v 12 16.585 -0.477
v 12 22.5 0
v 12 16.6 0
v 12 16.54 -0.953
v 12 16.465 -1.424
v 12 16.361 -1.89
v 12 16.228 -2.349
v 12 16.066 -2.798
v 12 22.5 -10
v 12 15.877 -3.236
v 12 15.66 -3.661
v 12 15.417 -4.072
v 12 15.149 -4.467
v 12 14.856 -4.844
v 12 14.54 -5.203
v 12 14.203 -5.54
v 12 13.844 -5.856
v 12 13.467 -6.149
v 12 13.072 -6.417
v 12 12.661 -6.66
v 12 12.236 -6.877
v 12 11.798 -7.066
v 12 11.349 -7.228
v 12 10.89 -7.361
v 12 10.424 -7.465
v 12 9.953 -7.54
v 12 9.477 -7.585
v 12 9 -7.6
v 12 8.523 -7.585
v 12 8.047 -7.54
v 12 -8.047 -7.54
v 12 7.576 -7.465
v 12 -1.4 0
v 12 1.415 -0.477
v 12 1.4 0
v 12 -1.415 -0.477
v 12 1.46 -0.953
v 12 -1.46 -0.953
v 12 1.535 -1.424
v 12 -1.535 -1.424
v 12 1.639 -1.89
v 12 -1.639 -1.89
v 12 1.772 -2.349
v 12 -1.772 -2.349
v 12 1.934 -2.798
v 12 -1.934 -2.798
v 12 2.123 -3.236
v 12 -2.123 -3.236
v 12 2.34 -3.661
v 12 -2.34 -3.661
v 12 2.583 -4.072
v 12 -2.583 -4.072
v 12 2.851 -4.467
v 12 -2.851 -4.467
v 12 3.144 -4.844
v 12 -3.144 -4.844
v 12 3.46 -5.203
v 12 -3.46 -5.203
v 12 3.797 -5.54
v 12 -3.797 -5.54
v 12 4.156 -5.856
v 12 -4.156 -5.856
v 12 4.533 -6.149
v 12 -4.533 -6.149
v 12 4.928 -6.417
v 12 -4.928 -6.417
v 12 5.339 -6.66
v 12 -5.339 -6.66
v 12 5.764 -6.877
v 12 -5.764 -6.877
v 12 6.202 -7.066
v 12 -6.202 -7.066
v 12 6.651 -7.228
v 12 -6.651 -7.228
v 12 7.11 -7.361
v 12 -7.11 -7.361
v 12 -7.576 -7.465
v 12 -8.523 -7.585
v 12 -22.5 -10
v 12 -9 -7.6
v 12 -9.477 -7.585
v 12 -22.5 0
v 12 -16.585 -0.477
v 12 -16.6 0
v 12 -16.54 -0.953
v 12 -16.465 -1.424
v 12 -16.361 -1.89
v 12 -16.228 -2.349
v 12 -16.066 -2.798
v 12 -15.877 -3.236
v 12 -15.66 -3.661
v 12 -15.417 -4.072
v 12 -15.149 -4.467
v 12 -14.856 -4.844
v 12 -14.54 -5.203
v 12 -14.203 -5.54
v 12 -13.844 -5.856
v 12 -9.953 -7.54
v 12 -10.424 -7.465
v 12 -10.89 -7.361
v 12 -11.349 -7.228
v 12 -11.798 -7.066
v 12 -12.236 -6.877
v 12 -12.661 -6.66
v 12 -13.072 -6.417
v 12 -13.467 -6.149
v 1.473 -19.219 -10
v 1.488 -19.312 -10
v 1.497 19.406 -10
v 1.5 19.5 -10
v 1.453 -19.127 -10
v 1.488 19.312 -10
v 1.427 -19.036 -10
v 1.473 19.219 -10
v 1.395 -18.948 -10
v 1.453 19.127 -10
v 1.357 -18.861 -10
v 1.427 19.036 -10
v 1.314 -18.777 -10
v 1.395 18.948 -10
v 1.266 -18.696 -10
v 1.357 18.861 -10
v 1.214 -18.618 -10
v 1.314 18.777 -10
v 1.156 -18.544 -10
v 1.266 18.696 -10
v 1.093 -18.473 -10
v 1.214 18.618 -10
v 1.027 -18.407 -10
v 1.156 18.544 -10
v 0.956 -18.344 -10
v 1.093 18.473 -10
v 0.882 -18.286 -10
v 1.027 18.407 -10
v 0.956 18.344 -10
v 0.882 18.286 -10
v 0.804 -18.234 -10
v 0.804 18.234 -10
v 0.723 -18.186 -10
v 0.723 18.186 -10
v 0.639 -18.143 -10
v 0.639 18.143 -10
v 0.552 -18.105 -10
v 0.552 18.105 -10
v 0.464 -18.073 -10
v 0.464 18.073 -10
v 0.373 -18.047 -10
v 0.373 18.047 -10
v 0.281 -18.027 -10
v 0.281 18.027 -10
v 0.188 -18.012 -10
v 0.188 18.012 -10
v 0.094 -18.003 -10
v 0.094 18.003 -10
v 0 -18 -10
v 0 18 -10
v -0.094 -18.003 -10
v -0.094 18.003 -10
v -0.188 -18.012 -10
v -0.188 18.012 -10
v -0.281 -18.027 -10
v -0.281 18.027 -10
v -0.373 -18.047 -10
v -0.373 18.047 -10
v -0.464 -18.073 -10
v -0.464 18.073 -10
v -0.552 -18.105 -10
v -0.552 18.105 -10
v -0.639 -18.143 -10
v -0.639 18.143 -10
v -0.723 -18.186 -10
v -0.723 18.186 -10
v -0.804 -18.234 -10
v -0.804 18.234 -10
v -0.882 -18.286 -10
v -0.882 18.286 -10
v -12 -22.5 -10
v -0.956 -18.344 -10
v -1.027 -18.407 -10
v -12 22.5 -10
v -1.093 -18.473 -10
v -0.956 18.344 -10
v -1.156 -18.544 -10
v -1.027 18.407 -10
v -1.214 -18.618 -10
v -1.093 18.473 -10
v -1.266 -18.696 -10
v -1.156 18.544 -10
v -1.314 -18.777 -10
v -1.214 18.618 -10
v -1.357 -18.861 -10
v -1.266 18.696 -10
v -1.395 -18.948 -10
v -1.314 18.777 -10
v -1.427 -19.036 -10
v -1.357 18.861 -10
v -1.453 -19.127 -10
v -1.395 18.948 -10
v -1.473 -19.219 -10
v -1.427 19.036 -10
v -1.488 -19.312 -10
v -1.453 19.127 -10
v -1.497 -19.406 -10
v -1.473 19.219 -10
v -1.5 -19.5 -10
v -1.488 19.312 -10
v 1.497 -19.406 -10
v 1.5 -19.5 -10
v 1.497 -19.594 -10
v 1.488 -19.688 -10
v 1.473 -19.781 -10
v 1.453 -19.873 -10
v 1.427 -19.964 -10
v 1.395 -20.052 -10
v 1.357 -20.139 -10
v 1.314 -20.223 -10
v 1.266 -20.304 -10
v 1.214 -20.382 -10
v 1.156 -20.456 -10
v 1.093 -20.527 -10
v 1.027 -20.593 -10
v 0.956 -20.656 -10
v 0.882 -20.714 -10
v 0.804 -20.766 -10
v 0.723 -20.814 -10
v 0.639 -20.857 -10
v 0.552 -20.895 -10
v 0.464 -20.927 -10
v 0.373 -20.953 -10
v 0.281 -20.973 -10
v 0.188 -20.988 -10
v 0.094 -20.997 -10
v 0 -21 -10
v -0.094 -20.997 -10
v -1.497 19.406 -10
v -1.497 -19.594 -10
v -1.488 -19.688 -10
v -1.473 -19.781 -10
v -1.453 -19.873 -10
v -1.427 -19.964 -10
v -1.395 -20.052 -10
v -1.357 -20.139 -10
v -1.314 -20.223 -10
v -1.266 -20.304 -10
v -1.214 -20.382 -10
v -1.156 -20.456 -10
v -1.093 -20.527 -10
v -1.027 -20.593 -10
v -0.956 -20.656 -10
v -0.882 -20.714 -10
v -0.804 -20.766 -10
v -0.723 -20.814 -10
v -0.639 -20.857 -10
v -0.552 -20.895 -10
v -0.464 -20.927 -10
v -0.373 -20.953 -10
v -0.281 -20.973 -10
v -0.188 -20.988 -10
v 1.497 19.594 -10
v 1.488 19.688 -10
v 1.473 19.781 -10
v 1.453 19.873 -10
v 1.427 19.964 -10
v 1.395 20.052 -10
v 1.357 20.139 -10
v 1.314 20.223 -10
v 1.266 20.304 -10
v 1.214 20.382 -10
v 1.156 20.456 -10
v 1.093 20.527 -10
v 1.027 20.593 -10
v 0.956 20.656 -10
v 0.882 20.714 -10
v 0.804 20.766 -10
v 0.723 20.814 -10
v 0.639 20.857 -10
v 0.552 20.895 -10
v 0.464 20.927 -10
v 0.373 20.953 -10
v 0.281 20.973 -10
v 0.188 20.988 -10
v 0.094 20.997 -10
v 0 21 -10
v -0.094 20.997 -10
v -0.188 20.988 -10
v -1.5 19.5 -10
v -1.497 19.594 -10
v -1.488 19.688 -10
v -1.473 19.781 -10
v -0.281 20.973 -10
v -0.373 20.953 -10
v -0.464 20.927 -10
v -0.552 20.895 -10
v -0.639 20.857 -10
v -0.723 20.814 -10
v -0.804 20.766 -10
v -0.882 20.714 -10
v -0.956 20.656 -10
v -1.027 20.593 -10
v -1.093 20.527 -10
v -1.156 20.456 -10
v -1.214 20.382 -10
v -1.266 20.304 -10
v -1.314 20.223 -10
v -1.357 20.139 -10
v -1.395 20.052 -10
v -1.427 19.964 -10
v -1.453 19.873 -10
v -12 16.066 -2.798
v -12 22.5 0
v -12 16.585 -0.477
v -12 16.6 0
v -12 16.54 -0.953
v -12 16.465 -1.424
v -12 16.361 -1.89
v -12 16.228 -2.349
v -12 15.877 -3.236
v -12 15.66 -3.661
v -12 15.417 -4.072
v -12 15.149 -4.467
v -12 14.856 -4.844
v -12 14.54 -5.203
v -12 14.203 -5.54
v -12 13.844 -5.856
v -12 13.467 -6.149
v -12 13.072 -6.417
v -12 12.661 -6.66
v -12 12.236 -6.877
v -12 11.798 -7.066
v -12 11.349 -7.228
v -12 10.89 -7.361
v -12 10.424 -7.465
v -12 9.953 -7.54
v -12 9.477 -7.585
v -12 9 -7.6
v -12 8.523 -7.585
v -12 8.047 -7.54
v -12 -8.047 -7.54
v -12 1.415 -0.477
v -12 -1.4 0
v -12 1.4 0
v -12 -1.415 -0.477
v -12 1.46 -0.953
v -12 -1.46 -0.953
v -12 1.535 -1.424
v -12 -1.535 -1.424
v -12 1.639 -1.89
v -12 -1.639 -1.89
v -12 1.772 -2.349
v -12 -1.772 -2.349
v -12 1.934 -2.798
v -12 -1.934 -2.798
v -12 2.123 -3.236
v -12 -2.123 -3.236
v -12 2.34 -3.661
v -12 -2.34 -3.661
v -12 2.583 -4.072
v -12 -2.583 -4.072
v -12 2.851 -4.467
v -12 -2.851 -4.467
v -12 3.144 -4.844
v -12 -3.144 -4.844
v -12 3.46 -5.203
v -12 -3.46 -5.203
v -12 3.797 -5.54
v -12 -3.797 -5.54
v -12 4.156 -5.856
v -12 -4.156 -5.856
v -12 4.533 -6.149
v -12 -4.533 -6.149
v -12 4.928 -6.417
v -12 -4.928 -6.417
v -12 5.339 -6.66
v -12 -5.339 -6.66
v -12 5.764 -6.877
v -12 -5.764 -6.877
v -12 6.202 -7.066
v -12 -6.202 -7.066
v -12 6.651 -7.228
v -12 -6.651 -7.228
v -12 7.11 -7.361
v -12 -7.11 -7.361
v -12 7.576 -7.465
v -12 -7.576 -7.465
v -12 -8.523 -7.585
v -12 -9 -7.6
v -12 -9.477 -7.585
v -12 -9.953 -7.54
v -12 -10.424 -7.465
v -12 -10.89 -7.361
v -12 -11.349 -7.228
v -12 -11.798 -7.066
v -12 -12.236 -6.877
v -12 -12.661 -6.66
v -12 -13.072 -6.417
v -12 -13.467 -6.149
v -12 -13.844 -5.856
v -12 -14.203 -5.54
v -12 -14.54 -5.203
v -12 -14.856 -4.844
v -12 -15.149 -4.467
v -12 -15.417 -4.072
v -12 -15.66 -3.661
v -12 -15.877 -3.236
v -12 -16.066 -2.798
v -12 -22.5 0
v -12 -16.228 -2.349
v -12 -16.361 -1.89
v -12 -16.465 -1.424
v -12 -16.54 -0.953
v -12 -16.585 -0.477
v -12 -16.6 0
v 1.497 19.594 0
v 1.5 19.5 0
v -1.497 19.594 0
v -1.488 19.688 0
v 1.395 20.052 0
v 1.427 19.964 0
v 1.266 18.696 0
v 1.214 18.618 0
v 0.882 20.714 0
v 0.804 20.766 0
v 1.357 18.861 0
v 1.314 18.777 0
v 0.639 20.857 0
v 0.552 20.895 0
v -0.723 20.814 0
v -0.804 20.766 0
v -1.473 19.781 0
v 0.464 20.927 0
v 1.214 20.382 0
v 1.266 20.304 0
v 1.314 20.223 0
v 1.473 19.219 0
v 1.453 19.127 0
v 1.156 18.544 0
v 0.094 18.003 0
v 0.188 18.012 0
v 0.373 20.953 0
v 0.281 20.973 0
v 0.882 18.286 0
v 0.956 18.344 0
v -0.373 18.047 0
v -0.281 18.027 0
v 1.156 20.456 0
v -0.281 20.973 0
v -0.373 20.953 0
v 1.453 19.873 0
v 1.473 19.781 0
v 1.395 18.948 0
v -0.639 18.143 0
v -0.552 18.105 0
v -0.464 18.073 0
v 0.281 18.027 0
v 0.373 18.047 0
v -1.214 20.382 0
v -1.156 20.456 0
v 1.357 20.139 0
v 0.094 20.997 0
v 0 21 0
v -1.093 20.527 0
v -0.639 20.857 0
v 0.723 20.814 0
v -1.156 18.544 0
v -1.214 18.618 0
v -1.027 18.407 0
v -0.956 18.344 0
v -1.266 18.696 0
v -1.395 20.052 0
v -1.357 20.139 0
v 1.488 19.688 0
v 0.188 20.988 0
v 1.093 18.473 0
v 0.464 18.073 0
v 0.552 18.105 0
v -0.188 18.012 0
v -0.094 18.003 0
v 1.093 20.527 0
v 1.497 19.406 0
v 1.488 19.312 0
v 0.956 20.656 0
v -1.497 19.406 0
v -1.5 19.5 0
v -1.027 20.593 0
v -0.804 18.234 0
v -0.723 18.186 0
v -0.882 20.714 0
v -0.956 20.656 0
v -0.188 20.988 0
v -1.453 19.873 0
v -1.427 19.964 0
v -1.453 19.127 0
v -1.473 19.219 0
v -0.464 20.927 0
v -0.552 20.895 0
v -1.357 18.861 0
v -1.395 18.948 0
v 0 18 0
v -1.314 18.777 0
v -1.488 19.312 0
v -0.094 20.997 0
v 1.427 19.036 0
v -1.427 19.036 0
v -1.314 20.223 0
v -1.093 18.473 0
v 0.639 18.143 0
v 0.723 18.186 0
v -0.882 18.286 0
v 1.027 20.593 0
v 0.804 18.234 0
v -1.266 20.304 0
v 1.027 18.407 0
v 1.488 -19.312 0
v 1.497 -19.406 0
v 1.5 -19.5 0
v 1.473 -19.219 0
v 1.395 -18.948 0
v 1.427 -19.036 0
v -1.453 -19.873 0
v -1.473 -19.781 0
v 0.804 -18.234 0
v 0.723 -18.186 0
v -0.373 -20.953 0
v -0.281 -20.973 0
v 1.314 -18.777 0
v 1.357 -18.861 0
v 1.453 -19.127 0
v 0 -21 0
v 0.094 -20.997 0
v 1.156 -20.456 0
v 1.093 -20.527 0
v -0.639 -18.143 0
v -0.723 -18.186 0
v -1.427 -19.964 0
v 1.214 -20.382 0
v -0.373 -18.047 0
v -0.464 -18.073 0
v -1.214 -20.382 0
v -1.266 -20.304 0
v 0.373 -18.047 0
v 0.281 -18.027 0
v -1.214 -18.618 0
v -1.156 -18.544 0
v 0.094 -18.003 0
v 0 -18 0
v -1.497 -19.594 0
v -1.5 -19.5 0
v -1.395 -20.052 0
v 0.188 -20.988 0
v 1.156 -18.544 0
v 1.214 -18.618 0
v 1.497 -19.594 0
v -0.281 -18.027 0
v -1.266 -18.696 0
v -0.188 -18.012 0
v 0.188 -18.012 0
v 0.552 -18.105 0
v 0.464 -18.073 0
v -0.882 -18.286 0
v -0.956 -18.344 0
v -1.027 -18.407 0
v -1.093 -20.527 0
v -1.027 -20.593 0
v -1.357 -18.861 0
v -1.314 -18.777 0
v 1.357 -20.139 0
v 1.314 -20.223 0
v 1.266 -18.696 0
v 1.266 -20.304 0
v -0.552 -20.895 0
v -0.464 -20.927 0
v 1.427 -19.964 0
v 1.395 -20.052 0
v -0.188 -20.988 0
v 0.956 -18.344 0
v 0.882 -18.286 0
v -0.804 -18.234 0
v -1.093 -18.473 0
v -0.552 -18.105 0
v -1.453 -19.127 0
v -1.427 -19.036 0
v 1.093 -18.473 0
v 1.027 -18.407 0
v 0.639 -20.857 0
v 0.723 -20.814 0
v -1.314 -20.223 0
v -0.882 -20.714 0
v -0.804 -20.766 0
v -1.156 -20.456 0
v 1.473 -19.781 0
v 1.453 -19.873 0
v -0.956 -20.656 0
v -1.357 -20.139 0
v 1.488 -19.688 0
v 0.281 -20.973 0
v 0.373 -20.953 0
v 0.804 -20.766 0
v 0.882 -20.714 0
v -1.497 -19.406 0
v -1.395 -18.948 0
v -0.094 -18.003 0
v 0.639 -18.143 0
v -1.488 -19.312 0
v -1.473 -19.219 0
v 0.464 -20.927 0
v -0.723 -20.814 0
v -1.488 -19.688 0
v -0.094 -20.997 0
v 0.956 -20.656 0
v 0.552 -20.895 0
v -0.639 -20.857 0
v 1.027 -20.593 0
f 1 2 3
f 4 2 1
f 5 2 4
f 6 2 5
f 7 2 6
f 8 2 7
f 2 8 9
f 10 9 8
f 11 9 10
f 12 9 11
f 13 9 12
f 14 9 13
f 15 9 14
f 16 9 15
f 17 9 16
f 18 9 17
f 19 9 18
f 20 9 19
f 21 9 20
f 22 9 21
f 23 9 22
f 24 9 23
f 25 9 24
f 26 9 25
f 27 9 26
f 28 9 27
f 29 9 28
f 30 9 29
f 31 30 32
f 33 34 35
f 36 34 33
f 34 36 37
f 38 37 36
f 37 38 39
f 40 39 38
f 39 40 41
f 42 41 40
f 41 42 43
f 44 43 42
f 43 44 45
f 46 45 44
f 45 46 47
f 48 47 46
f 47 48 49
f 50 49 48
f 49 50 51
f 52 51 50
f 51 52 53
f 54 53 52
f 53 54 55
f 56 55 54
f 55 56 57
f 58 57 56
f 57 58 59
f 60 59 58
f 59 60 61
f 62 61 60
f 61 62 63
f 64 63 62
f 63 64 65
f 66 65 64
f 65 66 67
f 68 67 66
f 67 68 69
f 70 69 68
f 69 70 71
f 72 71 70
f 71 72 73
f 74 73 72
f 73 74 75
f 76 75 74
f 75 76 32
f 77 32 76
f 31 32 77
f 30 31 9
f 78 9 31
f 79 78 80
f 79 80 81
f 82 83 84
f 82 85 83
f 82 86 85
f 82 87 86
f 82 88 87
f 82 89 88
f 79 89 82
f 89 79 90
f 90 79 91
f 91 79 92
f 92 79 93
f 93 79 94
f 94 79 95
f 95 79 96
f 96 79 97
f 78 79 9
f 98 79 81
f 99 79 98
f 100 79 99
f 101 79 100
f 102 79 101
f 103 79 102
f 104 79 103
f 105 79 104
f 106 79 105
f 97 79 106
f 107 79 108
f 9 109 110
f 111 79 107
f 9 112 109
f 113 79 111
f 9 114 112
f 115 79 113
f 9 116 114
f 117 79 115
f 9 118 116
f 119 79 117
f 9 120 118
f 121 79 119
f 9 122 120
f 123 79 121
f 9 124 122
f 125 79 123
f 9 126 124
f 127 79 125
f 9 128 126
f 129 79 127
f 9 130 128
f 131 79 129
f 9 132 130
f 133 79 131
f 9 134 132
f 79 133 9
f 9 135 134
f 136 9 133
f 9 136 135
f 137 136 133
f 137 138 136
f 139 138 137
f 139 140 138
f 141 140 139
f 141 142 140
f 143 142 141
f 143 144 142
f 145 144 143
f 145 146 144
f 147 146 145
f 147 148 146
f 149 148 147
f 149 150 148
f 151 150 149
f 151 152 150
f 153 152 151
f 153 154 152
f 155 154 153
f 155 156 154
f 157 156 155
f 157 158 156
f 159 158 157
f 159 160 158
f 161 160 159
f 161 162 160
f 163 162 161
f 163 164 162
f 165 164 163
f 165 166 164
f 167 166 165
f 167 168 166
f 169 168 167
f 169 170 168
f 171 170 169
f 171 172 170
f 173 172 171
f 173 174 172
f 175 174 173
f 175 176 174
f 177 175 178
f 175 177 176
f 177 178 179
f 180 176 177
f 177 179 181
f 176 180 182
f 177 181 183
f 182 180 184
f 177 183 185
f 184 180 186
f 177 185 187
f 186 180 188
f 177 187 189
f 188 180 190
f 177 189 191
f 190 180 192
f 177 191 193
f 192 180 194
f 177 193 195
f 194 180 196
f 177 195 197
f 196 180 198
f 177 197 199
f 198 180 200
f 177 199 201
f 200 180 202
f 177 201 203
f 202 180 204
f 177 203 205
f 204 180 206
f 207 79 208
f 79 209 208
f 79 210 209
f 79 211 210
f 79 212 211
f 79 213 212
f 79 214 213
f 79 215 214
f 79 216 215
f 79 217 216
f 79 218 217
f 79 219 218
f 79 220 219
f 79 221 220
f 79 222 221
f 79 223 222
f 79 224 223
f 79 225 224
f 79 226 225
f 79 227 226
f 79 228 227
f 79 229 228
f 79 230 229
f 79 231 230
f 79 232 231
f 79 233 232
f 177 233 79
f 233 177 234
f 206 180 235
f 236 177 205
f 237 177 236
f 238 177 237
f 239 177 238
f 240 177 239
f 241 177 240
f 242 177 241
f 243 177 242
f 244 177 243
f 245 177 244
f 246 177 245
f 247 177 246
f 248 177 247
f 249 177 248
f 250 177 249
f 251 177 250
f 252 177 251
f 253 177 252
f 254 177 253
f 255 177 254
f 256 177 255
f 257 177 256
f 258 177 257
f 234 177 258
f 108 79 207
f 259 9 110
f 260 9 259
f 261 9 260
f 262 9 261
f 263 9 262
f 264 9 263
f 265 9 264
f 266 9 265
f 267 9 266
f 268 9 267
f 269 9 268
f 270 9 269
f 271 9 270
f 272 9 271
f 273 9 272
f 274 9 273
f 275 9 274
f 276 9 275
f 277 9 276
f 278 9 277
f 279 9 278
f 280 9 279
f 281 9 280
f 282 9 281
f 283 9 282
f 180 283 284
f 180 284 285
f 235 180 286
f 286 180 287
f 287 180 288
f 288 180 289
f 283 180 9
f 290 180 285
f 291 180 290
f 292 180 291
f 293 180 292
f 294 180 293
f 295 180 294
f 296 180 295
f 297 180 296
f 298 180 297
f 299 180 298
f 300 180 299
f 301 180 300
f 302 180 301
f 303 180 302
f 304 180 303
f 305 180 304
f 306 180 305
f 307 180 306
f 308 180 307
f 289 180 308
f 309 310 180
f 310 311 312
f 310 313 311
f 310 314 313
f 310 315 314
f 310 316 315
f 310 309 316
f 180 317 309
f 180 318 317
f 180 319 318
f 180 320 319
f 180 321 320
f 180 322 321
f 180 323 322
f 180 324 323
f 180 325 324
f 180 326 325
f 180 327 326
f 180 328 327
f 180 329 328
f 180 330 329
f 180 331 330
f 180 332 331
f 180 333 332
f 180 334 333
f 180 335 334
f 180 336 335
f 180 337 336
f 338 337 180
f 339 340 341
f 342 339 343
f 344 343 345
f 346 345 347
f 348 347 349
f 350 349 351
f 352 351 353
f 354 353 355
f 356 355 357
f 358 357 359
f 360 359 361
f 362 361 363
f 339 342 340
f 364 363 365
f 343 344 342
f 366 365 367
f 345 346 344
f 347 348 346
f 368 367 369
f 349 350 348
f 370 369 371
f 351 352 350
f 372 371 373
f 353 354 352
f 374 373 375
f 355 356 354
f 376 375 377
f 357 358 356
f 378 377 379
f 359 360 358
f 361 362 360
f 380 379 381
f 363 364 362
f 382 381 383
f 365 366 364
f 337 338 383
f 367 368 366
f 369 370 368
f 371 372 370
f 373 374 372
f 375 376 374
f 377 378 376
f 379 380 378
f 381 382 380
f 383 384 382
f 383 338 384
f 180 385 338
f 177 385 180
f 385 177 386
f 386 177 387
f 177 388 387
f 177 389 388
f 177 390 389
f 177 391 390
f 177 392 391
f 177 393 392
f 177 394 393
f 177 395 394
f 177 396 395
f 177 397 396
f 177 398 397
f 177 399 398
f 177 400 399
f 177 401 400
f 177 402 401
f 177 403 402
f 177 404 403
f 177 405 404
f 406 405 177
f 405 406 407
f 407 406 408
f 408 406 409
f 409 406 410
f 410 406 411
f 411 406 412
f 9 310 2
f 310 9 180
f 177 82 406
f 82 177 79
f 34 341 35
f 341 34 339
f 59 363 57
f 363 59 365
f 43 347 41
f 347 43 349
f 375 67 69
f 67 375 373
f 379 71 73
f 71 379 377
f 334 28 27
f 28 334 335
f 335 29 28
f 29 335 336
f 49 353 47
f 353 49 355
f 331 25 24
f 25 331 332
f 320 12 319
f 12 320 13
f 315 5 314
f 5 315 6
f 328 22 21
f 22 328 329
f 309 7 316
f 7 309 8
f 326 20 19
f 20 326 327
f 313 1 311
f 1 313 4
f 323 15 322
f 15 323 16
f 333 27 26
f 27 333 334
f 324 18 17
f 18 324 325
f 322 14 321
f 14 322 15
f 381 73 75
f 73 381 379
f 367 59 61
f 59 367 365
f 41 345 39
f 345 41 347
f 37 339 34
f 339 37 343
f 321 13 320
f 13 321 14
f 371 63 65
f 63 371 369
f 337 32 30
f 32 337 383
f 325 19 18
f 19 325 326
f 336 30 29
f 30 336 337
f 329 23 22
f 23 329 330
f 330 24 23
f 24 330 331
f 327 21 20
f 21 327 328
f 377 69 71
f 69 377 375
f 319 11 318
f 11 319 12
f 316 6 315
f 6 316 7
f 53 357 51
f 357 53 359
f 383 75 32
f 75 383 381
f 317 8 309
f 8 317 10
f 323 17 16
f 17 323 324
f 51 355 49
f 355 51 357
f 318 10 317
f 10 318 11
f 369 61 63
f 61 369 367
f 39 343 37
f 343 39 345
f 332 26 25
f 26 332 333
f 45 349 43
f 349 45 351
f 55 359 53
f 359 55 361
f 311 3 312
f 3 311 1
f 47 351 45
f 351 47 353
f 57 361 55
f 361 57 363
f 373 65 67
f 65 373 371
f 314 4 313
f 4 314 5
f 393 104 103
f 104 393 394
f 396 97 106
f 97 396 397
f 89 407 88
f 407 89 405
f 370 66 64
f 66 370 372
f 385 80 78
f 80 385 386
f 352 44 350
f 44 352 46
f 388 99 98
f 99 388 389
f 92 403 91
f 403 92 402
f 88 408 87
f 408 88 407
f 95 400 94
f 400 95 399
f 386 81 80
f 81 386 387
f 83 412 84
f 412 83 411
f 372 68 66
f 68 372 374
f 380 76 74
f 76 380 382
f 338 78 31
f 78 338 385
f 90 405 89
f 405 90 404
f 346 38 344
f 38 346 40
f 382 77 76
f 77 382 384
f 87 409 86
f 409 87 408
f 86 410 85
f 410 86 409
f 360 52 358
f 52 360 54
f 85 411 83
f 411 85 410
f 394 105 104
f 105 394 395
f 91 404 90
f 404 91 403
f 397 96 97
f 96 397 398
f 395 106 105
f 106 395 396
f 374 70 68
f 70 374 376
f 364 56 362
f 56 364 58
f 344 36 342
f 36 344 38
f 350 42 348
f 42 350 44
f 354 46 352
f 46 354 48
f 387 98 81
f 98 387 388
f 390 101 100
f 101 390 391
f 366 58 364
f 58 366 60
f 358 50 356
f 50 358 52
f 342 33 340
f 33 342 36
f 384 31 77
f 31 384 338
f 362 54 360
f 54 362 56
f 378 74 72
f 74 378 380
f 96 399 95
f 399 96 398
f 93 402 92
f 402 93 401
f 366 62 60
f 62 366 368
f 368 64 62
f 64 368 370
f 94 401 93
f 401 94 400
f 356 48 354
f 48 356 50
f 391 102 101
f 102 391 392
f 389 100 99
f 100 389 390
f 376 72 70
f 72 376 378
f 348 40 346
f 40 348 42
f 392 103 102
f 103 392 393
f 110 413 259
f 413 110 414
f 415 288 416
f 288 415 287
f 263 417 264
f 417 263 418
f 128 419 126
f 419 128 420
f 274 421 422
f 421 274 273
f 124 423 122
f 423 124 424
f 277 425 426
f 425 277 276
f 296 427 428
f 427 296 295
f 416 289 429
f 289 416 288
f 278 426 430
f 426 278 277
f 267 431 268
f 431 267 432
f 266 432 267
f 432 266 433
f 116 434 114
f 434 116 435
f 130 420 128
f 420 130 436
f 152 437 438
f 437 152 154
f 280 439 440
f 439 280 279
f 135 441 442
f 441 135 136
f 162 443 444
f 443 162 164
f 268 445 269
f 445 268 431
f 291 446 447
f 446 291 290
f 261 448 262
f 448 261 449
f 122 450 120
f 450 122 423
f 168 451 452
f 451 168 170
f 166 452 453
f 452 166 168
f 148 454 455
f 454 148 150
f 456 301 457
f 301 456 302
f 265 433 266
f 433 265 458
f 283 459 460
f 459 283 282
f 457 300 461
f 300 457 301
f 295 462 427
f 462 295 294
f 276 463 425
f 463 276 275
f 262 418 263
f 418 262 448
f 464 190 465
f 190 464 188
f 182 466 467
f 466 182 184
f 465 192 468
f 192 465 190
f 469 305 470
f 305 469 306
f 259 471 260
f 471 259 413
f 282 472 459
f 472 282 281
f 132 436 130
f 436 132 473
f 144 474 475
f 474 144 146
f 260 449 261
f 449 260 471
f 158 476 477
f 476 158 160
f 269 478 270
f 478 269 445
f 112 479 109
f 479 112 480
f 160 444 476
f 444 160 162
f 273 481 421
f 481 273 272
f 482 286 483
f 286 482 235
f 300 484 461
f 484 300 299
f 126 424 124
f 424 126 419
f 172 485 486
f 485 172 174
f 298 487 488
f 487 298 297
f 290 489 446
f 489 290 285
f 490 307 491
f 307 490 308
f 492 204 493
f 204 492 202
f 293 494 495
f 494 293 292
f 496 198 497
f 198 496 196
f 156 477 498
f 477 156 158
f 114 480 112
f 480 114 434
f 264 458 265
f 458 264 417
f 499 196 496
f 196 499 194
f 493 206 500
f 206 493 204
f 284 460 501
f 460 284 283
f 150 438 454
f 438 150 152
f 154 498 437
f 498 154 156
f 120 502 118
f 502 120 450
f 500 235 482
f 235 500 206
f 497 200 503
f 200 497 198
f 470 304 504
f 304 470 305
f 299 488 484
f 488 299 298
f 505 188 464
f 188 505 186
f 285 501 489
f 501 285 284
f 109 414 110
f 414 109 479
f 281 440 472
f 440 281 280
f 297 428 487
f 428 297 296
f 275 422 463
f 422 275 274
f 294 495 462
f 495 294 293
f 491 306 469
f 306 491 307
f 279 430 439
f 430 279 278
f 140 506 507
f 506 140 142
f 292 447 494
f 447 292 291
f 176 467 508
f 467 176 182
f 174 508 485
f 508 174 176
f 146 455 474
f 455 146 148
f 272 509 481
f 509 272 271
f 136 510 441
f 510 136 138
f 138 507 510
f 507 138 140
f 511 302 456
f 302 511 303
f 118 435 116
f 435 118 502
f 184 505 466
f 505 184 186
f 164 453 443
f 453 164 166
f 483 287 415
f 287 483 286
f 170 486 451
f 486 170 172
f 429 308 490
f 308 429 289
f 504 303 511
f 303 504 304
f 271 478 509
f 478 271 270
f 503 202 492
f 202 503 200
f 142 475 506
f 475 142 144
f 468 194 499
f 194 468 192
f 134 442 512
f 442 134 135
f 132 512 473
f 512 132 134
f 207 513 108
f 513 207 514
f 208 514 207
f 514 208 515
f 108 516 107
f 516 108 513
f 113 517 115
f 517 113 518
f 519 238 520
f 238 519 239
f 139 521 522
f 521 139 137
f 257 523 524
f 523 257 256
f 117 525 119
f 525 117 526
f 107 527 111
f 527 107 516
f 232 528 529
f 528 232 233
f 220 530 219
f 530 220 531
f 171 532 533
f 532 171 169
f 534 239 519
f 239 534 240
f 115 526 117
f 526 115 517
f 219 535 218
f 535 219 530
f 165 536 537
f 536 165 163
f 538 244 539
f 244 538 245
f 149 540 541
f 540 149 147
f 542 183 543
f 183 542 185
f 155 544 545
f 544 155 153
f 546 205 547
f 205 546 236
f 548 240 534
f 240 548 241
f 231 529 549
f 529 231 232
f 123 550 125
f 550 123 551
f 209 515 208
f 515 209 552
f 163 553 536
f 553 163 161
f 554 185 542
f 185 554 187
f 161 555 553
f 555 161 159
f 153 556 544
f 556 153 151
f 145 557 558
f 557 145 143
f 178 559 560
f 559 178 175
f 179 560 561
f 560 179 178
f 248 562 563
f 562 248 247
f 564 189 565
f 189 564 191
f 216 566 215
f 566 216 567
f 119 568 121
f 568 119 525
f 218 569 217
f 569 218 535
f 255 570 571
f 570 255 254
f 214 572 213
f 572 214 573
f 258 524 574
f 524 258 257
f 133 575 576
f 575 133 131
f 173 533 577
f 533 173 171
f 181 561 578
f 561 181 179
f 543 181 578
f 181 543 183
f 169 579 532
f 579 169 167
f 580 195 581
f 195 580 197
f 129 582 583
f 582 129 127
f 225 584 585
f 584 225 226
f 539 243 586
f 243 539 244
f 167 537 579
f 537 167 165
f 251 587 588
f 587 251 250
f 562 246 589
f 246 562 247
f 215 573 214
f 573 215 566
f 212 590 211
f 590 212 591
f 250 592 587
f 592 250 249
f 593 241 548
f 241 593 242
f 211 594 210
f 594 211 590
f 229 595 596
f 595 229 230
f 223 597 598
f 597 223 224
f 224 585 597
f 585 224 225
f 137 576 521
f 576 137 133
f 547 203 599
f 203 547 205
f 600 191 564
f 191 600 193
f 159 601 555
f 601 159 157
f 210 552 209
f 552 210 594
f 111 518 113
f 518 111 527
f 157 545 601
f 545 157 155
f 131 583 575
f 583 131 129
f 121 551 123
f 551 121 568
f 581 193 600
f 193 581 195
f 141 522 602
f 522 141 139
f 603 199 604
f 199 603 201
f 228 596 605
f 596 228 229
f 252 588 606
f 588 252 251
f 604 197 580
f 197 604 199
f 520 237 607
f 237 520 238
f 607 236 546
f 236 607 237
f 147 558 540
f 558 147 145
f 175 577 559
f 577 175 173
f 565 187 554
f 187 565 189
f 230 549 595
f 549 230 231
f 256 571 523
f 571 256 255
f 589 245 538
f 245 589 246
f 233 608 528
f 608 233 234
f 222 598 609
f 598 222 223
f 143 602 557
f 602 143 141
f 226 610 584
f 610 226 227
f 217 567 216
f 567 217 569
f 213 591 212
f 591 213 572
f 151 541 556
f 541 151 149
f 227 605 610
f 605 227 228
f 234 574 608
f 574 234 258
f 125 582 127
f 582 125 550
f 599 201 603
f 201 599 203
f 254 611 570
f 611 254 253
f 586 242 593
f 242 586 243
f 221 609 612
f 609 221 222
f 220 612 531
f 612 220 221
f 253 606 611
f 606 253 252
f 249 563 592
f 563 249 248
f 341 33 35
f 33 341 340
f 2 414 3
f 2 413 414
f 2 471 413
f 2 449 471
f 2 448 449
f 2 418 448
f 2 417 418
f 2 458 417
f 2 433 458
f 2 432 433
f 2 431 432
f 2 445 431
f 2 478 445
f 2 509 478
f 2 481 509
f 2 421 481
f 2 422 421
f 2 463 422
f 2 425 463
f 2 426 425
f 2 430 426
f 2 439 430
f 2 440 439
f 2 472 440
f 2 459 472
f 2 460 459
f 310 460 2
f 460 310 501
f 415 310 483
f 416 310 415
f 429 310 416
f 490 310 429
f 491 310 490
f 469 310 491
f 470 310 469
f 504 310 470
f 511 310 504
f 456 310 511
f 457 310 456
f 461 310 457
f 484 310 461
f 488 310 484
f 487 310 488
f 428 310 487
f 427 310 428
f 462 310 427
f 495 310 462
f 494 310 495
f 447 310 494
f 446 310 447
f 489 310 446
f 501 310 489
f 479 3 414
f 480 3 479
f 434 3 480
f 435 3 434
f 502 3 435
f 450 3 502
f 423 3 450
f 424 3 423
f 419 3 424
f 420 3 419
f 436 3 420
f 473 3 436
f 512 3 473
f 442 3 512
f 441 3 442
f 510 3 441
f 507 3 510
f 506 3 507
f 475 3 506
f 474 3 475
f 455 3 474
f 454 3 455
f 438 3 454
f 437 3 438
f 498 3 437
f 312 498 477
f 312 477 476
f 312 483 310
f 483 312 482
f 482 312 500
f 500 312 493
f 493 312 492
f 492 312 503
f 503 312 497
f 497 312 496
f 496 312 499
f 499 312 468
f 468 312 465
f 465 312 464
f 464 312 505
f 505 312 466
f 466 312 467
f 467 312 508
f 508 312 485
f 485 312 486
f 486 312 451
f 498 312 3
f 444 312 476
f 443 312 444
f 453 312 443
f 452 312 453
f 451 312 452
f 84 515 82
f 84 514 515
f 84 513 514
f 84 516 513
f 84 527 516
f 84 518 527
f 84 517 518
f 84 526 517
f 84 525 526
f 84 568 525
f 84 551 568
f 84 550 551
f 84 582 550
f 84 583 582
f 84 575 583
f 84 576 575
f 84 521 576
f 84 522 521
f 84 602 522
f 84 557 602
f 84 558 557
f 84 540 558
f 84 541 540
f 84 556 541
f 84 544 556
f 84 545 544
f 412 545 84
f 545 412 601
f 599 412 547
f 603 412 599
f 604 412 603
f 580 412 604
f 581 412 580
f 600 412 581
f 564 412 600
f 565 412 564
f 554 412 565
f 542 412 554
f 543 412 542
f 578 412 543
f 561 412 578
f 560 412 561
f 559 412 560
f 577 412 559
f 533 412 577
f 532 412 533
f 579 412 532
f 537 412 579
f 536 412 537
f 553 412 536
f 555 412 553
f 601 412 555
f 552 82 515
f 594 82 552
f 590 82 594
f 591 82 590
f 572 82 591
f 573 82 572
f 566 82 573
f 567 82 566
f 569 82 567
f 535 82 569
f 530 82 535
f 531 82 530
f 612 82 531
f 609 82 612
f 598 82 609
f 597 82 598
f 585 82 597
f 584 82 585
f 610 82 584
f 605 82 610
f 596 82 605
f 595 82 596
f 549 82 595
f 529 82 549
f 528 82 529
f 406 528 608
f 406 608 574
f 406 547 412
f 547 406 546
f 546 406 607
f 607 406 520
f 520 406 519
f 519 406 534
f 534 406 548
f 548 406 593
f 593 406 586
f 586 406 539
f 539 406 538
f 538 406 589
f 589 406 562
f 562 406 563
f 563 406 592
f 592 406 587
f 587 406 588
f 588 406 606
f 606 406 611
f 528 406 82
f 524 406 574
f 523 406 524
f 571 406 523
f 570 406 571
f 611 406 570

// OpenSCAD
/*
    Scanner para análisis tridimensional de cobertura vegetal del suelo
    
    Descripción de la pieza: Carro de desplazamiento en direccion X. Contiene espacio para rodamientos lineales para varilla de 8mm (tiene 15 mm de diametro por 24 de largo). Debajo de esta pieza se atornilla el zocalo para el sensor láser.
    Cantidad requerida: 2.

    Autor: Matias J. Micheletto    
    Noviembre 2017
    Directores: Rodrigo Santos - Juan Galantini
    Laboratorio de Sistemas Digitales
    Universidad Nacional del Sur - Departamento de Ingeniería Eléctrica y Computadoras    
*/

$fn = 100; // Resolucion del modelo

// Dimensiones exteriores del montaje
W = 24; // Ancho (en direccion X)
L = 45; // Largo (en direccion Y)
H = 20; // Alto (en direccion Z)

// Varillas
R = 7.5+0.1; // Radio para rodamiento
d = 9; // Distancia de la varilla al centro (separacion intervarillas/2)

// Tornillos
Rp = 1.5; // Radio de los orificios para tornillos
s = 1.5; // Separacion entre el orificio y el borde de la pieza

difference(){
    // Envolvente de la pieza
    cube([W,L,H], center = true);
    
    // Espacio para las varillas con rodamiento
    rotate([0,90,0])
    translate([0,d,0])
        cylinder(r = R, h = W+1, center = true);
    rotate([0,90,0])
    translate([0,-d,0])
        cylinder(r = R, h = W+1, center = true);
    
    // Agujeros para tornillos
    translate([0,L/2-Rp-s,0])
        cylinder(r = Rp, h = H, center = true);
    translate([0,-L/2+Rp+s,0])
        cylinder(r = Rp, h = H, center = true);
    
    // Dibujar solo la mitad
    translate([0,0,H/4])
        cube([W,L,H/2],center=true);
}
